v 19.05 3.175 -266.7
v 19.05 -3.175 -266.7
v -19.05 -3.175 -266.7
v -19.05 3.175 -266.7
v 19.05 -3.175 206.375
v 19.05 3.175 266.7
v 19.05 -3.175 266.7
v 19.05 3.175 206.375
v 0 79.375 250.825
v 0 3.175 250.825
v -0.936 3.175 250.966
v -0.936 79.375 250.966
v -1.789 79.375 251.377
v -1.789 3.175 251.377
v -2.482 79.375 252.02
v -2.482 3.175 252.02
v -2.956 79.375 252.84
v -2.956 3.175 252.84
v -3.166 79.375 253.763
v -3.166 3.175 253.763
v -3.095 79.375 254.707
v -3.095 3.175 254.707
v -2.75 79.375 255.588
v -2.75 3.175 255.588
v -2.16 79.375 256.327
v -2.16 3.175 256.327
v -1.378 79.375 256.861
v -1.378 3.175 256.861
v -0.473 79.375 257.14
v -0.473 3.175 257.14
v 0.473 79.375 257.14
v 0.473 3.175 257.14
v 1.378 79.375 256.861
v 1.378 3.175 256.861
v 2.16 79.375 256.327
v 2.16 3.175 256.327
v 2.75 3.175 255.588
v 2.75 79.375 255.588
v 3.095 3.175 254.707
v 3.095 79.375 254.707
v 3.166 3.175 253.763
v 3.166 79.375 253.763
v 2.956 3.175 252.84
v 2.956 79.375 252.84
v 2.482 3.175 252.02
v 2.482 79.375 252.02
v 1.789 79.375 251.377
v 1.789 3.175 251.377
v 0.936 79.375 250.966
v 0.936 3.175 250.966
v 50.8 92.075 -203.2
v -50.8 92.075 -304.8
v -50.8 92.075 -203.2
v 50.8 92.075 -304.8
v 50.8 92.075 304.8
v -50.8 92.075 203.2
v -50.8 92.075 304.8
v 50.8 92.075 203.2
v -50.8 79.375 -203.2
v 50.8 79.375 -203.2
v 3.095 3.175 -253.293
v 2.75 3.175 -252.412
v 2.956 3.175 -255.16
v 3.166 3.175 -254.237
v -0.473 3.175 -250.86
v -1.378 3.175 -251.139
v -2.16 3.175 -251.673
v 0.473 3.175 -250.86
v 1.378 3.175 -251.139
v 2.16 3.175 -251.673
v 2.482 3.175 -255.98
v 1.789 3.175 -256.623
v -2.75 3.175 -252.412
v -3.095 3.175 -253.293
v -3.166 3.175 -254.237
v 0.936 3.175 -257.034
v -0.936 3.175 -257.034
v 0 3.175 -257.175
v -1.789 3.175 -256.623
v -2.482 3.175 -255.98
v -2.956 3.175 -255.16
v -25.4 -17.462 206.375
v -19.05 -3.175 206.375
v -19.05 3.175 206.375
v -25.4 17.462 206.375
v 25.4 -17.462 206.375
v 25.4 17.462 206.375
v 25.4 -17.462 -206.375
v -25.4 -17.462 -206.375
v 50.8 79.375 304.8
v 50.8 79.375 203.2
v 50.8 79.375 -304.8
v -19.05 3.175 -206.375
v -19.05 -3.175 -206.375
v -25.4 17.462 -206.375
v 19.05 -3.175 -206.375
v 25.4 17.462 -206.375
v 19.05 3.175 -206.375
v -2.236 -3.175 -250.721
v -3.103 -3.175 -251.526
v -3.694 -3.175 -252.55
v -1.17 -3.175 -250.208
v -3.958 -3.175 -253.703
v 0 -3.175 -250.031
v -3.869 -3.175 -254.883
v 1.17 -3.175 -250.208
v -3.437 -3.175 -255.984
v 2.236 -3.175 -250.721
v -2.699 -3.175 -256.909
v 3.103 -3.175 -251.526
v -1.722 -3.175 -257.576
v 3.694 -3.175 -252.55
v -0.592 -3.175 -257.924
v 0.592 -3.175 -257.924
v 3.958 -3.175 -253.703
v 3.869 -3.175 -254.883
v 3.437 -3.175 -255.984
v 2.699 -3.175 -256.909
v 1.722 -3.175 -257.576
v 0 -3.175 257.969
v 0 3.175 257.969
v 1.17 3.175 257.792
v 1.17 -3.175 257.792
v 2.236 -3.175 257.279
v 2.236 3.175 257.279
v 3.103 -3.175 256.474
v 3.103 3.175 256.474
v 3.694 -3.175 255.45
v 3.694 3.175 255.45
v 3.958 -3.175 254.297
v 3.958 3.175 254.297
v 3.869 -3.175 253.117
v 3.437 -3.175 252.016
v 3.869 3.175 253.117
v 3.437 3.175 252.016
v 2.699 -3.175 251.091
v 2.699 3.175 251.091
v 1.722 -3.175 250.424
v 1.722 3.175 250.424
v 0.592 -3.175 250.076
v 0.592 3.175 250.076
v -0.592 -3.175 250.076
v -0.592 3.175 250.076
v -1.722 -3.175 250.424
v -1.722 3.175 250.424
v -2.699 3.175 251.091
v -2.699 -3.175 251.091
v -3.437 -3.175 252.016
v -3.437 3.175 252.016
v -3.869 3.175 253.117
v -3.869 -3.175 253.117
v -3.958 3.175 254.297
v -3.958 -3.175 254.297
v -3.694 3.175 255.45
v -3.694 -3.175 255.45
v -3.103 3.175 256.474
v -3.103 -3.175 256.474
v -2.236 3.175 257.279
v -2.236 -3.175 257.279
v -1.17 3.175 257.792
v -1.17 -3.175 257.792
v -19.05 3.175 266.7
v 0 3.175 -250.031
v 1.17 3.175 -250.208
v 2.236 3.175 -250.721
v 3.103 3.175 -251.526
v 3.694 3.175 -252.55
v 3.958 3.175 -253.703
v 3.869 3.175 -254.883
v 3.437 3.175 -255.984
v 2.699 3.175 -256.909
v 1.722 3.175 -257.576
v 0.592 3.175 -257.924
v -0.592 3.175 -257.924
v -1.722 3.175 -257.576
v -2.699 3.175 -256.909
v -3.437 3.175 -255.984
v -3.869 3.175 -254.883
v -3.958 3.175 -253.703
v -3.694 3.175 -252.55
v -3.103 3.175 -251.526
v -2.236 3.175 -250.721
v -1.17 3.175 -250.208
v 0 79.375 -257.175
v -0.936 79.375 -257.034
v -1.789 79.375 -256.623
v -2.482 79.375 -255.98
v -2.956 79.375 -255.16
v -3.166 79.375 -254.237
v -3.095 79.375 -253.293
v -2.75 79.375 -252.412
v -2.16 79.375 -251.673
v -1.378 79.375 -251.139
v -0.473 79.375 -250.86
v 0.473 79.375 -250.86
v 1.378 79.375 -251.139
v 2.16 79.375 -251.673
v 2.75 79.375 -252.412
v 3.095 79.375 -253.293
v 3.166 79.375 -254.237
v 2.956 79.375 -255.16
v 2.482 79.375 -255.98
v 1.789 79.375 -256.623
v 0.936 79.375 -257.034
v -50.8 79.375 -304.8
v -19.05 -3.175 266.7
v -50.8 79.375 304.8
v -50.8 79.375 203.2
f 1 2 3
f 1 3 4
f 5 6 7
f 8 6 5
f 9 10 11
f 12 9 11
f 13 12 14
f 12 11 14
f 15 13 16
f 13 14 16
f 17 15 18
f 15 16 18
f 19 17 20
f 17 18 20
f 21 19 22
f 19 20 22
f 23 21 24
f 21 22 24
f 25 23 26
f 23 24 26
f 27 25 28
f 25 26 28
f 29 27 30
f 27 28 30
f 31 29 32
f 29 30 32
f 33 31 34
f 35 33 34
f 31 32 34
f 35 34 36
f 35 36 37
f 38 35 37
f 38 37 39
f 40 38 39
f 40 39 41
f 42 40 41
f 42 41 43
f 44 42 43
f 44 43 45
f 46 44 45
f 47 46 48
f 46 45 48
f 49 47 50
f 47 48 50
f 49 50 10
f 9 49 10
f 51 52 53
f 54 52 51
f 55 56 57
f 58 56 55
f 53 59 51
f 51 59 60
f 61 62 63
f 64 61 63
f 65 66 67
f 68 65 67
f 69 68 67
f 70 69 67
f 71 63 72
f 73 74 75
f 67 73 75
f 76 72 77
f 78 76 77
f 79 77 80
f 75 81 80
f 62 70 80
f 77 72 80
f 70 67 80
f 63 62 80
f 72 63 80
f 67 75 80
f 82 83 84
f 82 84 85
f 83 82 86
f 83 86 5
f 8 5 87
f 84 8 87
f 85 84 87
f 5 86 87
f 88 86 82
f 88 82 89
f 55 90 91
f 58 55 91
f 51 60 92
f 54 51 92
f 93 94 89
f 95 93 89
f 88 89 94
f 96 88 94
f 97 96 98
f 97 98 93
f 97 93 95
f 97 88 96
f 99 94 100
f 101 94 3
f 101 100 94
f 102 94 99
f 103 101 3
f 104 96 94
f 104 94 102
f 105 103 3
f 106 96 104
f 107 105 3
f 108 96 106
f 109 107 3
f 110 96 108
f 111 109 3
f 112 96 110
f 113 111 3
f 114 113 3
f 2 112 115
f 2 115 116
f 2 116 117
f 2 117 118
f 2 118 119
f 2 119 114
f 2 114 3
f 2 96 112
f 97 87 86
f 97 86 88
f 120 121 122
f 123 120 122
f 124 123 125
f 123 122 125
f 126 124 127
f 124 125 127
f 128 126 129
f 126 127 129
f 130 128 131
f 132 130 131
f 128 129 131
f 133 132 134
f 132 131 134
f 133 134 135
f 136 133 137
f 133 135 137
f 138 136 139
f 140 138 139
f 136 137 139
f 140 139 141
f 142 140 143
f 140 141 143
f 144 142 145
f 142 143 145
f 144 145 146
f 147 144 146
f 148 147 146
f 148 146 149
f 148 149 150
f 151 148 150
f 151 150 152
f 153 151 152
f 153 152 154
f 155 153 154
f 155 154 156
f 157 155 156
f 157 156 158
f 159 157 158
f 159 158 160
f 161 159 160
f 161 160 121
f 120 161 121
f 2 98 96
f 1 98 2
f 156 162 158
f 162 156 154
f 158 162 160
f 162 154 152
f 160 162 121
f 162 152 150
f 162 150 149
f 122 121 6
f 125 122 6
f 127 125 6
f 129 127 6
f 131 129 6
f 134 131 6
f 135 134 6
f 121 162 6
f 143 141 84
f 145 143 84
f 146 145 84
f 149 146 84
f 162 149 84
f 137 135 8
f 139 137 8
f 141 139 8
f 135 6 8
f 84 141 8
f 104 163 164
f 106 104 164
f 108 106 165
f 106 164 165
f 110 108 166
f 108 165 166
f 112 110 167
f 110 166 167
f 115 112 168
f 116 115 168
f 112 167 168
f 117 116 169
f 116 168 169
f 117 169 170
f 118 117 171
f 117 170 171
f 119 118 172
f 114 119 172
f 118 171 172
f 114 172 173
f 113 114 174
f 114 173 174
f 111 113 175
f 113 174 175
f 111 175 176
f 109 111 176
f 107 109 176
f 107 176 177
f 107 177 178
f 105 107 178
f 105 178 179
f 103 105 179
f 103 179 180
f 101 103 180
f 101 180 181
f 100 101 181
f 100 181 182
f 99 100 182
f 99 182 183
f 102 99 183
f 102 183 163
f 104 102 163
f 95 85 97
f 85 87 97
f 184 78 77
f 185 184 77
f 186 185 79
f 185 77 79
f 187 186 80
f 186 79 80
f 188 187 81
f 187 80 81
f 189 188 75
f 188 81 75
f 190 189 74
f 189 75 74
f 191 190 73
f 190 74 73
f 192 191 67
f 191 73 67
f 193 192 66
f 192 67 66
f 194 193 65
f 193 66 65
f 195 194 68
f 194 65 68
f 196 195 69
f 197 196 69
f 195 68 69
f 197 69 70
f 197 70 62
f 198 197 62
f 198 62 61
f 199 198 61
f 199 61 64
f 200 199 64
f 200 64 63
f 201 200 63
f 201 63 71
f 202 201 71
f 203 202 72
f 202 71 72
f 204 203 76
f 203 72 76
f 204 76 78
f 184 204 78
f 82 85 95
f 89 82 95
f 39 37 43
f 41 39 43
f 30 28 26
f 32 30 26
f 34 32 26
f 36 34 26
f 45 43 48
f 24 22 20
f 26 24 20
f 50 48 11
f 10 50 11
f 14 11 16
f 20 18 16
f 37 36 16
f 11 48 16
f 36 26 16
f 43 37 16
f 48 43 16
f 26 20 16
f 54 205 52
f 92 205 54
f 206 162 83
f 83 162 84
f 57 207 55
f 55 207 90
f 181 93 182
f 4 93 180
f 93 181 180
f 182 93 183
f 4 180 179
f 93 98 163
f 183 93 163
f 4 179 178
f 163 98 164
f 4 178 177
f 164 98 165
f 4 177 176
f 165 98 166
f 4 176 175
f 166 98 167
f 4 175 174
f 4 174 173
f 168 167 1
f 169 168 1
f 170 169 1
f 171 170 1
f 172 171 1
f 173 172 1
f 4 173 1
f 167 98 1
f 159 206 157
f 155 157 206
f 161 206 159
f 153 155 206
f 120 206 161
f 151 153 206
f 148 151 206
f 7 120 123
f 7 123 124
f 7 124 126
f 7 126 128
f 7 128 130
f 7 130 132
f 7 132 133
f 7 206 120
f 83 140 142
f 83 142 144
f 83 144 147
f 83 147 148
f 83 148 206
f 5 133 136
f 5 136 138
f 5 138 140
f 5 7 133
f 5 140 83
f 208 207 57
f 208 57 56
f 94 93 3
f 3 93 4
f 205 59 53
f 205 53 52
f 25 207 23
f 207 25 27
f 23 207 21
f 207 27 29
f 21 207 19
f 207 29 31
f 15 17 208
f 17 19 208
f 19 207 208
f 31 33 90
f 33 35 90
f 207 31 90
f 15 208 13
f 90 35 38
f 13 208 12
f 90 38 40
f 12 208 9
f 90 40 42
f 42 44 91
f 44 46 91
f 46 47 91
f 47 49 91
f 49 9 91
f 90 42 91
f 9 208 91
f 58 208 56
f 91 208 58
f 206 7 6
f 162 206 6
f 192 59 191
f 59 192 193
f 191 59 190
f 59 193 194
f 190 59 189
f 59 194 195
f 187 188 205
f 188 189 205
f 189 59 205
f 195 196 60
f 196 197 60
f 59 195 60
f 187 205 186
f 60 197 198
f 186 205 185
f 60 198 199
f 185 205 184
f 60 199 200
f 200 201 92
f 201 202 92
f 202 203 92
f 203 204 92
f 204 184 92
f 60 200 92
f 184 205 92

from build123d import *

# Parameters (mm, degrees)
SKETCH2_W             = 533.4
SKETCH2_H             = 6.35
BOSS_EXTRUDE1_DEPTH   = 19.05
SKETCH3_W             = 412.75
SKETCH3_H             = 34.925
BOSS_EXTRUDE2_DEPTH   = 25.4
SKETCH4_R             = 3.96875
CUT_EXTRUDE1_DEPTH    = 269.700495731
SKETCH5_R             = 3.175
BOSS_EXTRUDE3_DEPTH   = 76.2
BOSS_EXTRUDE3_2_DEPTH = 76.2
SKETCH6_W             = 101.6
SKETCH6_H             = 101.6
BOSS_EXTRUDE4_DEPTH   = 12.7


with BuildPart() as part:
    # Sketch2 → Boss-Extrude1 (new, symmetric)
    with BuildSketch(Plane(origin=(0, 0, 0), x_dir=(0, 0, -1), z_dir=(1, 0, 0))):
        Rectangle(SKETCH2_W, SKETCH2_H)
    extrude(amount=BOSS_EXTRUDE1_DEPTH, both=True)

    # Sketch3 → Boss-Extrude2 (add, symmetric)
    with BuildSketch(Plane(origin=(0, 0, 0), x_dir=(0, 0, -1), z_dir=(1, 0, 0))):
        Rectangle(SKETCH3_W, SKETCH3_H)
    extrude(amount=BOSS_EXTRUDE2_DEPTH, both=True)

    # Sketch4 → Cut-Extrude1 (cut, through all)
    with BuildSketch(Plane(origin=(0, 3.175, 0), x_dir=(1, 0, 0), z_dir=(0, 1, 0))):
        with Locations(Location((0, 254, 0), (0, 0, 270))):
            Circle(SKETCH4_R)
        with Locations(Location((0, -254, 0), (0, 0, 270))):
            Circle(SKETCH4_R)
    extrude(amount=-CUT_EXTRUDE1_DEPTH, mode=Mode.SUBTRACT)


with BuildPart() as body_2:
    # Sketch5 → Boss-Extrude3 (new body)
    with BuildSketch(Plane(origin=(0, 3.175, 0), x_dir=(1, 0, 0), z_dir=(0, 1, 0))):
        with Locations(Location((0, 254, 0), (0, 0, 90))):
            Circle(SKETCH5_R)
    extrude(amount=BOSS_EXTRUDE3_DEPTH)



with BuildPart() as body_3:
    # Sketch5 → Boss-Extrude3 2 (new body)
    with BuildSketch(Plane(origin=(0, 3.175, 0), x_dir=(1, 0, 0), z_dir=(0, 1, 0))):
        with Locations(Location((0, -254, 0), (0, 0, 90))):
            Circle(SKETCH5_R)
    extrude(amount=BOSS_EXTRUDE3_2_DEPTH)


with BuildPart() as body_2_1:
    add(body_2.part)

    add(body_3.part)  # Boss-Extrude4 merges body 3
    # Sketch6 → Boss-Extrude4 (add)
    with BuildSketch(Plane(origin=(0, 79.375, 0), x_dir=(1, 0, 0), z_dir=(0, 1, 0))):
        with Locations((0, 254)):
            Rectangle(SKETCH6_W, SKETCH6_H)
        with Locations((0, -254)):
            Rectangle(SKETCH6_W, SKETCH6_H)
    extrude(amount=BOSS_EXTRUDE4_DEPTH)


solid = Compound([part.part, body_2_1.part])
